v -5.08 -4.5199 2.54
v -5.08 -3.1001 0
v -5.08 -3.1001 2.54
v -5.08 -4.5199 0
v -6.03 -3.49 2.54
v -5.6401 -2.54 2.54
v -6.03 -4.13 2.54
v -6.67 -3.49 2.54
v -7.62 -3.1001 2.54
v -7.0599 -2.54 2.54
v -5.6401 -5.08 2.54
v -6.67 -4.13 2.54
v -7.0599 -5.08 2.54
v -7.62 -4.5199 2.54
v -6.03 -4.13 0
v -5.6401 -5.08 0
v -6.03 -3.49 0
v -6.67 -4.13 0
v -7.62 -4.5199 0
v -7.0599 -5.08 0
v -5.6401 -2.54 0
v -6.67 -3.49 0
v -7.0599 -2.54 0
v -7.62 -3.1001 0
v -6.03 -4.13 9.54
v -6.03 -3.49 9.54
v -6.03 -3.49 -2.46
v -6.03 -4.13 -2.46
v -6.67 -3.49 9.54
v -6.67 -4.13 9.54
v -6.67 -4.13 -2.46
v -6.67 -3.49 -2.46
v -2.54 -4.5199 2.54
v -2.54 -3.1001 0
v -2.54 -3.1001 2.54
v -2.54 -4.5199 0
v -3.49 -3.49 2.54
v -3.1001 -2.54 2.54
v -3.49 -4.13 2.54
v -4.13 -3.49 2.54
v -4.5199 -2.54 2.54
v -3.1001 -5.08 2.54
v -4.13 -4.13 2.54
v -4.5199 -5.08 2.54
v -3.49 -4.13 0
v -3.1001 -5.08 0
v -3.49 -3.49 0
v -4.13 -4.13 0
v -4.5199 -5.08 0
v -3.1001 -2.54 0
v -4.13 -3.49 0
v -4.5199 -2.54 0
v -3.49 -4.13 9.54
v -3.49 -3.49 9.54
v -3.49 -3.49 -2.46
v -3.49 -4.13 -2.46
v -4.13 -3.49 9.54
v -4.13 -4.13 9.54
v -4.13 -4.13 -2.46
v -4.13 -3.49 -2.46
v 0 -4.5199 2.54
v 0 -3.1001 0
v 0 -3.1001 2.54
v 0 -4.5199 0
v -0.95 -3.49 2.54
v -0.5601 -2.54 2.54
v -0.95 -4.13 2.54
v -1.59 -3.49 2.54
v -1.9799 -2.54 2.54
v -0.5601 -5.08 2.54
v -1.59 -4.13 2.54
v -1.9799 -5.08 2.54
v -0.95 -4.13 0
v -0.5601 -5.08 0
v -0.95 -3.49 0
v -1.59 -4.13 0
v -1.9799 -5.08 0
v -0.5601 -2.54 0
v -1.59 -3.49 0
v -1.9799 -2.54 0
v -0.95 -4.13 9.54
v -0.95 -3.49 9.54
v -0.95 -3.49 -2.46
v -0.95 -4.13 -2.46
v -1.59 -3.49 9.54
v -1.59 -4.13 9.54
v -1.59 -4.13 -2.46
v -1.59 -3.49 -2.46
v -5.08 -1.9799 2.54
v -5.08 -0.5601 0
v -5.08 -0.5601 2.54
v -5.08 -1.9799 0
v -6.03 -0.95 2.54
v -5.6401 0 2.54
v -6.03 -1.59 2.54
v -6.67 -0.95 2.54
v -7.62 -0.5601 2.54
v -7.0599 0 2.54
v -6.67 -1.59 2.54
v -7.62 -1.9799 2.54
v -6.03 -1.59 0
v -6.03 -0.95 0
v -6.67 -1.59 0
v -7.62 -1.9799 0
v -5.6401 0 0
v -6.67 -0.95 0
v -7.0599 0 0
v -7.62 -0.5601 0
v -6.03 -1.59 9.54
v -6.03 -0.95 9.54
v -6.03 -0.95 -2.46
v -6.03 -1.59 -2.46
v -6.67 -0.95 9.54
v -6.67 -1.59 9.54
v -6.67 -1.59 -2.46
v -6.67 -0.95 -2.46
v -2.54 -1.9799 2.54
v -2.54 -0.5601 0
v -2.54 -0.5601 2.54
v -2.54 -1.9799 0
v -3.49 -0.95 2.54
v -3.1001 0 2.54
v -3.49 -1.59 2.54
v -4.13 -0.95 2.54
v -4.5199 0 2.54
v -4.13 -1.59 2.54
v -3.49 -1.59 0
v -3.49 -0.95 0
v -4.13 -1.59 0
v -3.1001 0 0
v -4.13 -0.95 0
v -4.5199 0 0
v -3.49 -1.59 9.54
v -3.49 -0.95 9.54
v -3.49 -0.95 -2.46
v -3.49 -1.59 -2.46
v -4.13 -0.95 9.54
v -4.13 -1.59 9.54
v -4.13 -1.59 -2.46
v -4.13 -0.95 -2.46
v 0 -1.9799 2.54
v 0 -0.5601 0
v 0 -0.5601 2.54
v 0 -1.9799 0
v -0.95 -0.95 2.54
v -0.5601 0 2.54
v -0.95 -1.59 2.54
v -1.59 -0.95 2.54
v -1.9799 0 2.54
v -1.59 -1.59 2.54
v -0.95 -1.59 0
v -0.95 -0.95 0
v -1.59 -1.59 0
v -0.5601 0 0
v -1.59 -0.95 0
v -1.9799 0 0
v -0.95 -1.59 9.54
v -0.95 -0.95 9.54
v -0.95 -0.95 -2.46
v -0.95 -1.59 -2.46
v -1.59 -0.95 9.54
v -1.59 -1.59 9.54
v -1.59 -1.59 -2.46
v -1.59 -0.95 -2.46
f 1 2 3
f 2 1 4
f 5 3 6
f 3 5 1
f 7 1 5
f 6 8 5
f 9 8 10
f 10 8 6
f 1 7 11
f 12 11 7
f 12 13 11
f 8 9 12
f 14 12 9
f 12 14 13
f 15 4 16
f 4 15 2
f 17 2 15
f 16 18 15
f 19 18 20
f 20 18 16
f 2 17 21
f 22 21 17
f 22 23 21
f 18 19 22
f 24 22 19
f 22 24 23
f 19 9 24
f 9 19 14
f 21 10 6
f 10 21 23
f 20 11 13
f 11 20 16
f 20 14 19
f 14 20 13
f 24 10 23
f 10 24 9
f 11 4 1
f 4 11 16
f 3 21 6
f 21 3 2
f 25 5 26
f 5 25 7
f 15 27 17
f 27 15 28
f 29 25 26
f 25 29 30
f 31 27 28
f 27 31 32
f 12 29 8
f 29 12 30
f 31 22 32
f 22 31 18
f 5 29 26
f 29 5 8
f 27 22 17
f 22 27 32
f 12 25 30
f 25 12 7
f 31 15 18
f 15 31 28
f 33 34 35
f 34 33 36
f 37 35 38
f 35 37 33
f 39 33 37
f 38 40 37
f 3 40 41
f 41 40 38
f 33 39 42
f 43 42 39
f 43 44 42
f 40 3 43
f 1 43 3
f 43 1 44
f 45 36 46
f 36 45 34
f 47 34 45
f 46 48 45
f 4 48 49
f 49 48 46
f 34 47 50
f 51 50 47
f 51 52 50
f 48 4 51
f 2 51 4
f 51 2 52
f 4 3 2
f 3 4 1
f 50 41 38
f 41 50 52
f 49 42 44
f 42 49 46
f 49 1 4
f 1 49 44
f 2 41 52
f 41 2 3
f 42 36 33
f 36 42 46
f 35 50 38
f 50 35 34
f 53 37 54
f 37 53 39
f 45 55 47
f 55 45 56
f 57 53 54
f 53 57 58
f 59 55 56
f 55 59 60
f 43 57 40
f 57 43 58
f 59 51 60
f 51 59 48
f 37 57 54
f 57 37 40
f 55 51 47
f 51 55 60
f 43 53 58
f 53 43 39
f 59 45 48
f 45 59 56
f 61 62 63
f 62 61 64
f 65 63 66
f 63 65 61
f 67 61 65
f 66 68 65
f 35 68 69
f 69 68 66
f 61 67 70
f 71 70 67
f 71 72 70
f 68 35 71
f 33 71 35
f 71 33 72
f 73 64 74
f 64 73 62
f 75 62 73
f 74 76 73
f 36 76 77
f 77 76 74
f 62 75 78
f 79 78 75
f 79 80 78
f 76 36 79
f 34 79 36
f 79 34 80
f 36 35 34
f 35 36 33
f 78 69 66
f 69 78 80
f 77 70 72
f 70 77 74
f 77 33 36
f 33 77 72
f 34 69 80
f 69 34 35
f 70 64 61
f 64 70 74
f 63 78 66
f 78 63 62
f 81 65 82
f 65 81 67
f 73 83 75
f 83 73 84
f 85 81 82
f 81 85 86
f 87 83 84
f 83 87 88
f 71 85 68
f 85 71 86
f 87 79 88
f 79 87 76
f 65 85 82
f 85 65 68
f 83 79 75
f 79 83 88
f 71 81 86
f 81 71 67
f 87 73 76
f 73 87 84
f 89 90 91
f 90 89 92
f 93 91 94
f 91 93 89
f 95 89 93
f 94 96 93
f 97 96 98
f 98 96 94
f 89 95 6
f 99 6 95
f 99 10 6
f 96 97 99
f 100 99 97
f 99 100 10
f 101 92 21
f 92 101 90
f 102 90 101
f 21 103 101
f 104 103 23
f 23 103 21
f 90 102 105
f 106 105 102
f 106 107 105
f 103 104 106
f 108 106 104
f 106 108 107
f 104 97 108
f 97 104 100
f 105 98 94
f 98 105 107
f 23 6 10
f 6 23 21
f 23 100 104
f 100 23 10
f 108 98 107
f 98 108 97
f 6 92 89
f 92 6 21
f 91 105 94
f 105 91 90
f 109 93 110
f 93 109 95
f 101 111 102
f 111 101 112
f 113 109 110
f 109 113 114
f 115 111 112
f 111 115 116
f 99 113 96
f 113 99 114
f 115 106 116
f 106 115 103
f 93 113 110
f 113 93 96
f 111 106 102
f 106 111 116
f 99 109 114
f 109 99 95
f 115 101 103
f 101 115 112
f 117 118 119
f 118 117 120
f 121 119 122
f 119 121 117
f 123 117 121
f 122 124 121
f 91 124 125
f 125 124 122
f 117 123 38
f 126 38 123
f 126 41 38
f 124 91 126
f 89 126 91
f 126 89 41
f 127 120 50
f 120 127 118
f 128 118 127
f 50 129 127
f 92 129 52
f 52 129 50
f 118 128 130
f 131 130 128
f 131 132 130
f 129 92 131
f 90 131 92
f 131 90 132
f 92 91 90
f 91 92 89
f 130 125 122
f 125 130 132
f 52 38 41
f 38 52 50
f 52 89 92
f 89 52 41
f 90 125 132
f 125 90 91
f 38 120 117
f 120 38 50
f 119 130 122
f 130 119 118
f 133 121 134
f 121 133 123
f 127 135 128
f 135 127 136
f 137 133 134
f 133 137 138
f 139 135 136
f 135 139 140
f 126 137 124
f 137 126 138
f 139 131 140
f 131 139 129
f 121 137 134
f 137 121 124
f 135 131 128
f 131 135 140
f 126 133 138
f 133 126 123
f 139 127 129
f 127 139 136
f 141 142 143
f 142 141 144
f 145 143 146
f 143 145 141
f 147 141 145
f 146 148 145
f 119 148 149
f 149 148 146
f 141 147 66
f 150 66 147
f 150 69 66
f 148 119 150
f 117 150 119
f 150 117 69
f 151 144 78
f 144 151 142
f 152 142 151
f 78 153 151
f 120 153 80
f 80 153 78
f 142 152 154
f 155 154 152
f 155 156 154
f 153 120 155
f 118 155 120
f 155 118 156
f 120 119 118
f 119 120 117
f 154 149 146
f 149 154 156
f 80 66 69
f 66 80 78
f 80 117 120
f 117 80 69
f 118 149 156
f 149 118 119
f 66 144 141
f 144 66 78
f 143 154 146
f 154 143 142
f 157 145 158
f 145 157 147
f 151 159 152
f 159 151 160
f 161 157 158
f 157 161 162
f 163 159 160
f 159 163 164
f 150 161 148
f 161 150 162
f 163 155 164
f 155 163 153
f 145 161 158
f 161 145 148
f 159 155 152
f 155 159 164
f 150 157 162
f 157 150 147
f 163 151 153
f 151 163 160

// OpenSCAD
// pin_headers.scad
//
// Model of through-hole pin headers. 
// 
// Units are metric
//
// "height" is the total length of the pin. Default is 12mm.
// "upper" is the length of the pin above the stopper. Default is 7mm.
// "rows" is the number of rows. Default is 3.
// "cols" is the number of columns. Default is 2.
//
// Examples:
// pin_header( 12, 7, 2, 5);
// pin_header( rows=5 cols=1 );
// By Paul McGovern

module off_pin_header(height=12, upper=7, rows=3, cols=2) {
cl = 2.54;
translate( [ -(rows  * cl/2 ), -(cols  * cl/2 ), 0 ] )
pin_header(height, upper, rows,cols);
}

module pin_header( height=12, upper=7, rows=3, cols=2 ) {

	cl = 2.54;

	translate( [ -(rows  * cl/2 ) + cl /2, -(cols  * cl/2 ) + cl /2, 0 ] ) {

		for( col = [0: cols -1 ] ) {
			for( row = [0 : rows -1 ] ) {

				translate( [ cl * row , cl * col, 0] ) {
	
					color( "gray" )
						translate( [0,0, cl / 2]) {
							intersection() {
								cube( [ cl, cl, cl ], center=true );
								rotate( [0, 0, 45] ) cube( [ 2.8, 2.8, cl ], center=true );
						}
				}

				color( "gold" ) {
					translate( [0,0, (upper - ( height/2 )) + cl ] ) {
						union() {
							cube( [0.64,0.64,height], center=true );
							translate( [0,0, height/2 ] ) scale( 0.64 ) _pin_point();
							translate( [0,0, -height/2 ] ) scale( 0.64 )	rotate([180,0,0] )_pin_point();
						}
					}
				}
			}
		}
	}
}
}

module _pin_point() {
	translate( [-0.5,-0.5, 0])
		polyhedron( 
			points=[[0,0,0],[0,1,0],[1,1,0],[1,0,0],[0.5,0.5,0.5]], 
			triangles=[[0,1,2],[0,2,3],[0,1,4],[1,2,4],[2,3,4],[3,0,4]]);
}

off_pin_header();
%pin_header();
